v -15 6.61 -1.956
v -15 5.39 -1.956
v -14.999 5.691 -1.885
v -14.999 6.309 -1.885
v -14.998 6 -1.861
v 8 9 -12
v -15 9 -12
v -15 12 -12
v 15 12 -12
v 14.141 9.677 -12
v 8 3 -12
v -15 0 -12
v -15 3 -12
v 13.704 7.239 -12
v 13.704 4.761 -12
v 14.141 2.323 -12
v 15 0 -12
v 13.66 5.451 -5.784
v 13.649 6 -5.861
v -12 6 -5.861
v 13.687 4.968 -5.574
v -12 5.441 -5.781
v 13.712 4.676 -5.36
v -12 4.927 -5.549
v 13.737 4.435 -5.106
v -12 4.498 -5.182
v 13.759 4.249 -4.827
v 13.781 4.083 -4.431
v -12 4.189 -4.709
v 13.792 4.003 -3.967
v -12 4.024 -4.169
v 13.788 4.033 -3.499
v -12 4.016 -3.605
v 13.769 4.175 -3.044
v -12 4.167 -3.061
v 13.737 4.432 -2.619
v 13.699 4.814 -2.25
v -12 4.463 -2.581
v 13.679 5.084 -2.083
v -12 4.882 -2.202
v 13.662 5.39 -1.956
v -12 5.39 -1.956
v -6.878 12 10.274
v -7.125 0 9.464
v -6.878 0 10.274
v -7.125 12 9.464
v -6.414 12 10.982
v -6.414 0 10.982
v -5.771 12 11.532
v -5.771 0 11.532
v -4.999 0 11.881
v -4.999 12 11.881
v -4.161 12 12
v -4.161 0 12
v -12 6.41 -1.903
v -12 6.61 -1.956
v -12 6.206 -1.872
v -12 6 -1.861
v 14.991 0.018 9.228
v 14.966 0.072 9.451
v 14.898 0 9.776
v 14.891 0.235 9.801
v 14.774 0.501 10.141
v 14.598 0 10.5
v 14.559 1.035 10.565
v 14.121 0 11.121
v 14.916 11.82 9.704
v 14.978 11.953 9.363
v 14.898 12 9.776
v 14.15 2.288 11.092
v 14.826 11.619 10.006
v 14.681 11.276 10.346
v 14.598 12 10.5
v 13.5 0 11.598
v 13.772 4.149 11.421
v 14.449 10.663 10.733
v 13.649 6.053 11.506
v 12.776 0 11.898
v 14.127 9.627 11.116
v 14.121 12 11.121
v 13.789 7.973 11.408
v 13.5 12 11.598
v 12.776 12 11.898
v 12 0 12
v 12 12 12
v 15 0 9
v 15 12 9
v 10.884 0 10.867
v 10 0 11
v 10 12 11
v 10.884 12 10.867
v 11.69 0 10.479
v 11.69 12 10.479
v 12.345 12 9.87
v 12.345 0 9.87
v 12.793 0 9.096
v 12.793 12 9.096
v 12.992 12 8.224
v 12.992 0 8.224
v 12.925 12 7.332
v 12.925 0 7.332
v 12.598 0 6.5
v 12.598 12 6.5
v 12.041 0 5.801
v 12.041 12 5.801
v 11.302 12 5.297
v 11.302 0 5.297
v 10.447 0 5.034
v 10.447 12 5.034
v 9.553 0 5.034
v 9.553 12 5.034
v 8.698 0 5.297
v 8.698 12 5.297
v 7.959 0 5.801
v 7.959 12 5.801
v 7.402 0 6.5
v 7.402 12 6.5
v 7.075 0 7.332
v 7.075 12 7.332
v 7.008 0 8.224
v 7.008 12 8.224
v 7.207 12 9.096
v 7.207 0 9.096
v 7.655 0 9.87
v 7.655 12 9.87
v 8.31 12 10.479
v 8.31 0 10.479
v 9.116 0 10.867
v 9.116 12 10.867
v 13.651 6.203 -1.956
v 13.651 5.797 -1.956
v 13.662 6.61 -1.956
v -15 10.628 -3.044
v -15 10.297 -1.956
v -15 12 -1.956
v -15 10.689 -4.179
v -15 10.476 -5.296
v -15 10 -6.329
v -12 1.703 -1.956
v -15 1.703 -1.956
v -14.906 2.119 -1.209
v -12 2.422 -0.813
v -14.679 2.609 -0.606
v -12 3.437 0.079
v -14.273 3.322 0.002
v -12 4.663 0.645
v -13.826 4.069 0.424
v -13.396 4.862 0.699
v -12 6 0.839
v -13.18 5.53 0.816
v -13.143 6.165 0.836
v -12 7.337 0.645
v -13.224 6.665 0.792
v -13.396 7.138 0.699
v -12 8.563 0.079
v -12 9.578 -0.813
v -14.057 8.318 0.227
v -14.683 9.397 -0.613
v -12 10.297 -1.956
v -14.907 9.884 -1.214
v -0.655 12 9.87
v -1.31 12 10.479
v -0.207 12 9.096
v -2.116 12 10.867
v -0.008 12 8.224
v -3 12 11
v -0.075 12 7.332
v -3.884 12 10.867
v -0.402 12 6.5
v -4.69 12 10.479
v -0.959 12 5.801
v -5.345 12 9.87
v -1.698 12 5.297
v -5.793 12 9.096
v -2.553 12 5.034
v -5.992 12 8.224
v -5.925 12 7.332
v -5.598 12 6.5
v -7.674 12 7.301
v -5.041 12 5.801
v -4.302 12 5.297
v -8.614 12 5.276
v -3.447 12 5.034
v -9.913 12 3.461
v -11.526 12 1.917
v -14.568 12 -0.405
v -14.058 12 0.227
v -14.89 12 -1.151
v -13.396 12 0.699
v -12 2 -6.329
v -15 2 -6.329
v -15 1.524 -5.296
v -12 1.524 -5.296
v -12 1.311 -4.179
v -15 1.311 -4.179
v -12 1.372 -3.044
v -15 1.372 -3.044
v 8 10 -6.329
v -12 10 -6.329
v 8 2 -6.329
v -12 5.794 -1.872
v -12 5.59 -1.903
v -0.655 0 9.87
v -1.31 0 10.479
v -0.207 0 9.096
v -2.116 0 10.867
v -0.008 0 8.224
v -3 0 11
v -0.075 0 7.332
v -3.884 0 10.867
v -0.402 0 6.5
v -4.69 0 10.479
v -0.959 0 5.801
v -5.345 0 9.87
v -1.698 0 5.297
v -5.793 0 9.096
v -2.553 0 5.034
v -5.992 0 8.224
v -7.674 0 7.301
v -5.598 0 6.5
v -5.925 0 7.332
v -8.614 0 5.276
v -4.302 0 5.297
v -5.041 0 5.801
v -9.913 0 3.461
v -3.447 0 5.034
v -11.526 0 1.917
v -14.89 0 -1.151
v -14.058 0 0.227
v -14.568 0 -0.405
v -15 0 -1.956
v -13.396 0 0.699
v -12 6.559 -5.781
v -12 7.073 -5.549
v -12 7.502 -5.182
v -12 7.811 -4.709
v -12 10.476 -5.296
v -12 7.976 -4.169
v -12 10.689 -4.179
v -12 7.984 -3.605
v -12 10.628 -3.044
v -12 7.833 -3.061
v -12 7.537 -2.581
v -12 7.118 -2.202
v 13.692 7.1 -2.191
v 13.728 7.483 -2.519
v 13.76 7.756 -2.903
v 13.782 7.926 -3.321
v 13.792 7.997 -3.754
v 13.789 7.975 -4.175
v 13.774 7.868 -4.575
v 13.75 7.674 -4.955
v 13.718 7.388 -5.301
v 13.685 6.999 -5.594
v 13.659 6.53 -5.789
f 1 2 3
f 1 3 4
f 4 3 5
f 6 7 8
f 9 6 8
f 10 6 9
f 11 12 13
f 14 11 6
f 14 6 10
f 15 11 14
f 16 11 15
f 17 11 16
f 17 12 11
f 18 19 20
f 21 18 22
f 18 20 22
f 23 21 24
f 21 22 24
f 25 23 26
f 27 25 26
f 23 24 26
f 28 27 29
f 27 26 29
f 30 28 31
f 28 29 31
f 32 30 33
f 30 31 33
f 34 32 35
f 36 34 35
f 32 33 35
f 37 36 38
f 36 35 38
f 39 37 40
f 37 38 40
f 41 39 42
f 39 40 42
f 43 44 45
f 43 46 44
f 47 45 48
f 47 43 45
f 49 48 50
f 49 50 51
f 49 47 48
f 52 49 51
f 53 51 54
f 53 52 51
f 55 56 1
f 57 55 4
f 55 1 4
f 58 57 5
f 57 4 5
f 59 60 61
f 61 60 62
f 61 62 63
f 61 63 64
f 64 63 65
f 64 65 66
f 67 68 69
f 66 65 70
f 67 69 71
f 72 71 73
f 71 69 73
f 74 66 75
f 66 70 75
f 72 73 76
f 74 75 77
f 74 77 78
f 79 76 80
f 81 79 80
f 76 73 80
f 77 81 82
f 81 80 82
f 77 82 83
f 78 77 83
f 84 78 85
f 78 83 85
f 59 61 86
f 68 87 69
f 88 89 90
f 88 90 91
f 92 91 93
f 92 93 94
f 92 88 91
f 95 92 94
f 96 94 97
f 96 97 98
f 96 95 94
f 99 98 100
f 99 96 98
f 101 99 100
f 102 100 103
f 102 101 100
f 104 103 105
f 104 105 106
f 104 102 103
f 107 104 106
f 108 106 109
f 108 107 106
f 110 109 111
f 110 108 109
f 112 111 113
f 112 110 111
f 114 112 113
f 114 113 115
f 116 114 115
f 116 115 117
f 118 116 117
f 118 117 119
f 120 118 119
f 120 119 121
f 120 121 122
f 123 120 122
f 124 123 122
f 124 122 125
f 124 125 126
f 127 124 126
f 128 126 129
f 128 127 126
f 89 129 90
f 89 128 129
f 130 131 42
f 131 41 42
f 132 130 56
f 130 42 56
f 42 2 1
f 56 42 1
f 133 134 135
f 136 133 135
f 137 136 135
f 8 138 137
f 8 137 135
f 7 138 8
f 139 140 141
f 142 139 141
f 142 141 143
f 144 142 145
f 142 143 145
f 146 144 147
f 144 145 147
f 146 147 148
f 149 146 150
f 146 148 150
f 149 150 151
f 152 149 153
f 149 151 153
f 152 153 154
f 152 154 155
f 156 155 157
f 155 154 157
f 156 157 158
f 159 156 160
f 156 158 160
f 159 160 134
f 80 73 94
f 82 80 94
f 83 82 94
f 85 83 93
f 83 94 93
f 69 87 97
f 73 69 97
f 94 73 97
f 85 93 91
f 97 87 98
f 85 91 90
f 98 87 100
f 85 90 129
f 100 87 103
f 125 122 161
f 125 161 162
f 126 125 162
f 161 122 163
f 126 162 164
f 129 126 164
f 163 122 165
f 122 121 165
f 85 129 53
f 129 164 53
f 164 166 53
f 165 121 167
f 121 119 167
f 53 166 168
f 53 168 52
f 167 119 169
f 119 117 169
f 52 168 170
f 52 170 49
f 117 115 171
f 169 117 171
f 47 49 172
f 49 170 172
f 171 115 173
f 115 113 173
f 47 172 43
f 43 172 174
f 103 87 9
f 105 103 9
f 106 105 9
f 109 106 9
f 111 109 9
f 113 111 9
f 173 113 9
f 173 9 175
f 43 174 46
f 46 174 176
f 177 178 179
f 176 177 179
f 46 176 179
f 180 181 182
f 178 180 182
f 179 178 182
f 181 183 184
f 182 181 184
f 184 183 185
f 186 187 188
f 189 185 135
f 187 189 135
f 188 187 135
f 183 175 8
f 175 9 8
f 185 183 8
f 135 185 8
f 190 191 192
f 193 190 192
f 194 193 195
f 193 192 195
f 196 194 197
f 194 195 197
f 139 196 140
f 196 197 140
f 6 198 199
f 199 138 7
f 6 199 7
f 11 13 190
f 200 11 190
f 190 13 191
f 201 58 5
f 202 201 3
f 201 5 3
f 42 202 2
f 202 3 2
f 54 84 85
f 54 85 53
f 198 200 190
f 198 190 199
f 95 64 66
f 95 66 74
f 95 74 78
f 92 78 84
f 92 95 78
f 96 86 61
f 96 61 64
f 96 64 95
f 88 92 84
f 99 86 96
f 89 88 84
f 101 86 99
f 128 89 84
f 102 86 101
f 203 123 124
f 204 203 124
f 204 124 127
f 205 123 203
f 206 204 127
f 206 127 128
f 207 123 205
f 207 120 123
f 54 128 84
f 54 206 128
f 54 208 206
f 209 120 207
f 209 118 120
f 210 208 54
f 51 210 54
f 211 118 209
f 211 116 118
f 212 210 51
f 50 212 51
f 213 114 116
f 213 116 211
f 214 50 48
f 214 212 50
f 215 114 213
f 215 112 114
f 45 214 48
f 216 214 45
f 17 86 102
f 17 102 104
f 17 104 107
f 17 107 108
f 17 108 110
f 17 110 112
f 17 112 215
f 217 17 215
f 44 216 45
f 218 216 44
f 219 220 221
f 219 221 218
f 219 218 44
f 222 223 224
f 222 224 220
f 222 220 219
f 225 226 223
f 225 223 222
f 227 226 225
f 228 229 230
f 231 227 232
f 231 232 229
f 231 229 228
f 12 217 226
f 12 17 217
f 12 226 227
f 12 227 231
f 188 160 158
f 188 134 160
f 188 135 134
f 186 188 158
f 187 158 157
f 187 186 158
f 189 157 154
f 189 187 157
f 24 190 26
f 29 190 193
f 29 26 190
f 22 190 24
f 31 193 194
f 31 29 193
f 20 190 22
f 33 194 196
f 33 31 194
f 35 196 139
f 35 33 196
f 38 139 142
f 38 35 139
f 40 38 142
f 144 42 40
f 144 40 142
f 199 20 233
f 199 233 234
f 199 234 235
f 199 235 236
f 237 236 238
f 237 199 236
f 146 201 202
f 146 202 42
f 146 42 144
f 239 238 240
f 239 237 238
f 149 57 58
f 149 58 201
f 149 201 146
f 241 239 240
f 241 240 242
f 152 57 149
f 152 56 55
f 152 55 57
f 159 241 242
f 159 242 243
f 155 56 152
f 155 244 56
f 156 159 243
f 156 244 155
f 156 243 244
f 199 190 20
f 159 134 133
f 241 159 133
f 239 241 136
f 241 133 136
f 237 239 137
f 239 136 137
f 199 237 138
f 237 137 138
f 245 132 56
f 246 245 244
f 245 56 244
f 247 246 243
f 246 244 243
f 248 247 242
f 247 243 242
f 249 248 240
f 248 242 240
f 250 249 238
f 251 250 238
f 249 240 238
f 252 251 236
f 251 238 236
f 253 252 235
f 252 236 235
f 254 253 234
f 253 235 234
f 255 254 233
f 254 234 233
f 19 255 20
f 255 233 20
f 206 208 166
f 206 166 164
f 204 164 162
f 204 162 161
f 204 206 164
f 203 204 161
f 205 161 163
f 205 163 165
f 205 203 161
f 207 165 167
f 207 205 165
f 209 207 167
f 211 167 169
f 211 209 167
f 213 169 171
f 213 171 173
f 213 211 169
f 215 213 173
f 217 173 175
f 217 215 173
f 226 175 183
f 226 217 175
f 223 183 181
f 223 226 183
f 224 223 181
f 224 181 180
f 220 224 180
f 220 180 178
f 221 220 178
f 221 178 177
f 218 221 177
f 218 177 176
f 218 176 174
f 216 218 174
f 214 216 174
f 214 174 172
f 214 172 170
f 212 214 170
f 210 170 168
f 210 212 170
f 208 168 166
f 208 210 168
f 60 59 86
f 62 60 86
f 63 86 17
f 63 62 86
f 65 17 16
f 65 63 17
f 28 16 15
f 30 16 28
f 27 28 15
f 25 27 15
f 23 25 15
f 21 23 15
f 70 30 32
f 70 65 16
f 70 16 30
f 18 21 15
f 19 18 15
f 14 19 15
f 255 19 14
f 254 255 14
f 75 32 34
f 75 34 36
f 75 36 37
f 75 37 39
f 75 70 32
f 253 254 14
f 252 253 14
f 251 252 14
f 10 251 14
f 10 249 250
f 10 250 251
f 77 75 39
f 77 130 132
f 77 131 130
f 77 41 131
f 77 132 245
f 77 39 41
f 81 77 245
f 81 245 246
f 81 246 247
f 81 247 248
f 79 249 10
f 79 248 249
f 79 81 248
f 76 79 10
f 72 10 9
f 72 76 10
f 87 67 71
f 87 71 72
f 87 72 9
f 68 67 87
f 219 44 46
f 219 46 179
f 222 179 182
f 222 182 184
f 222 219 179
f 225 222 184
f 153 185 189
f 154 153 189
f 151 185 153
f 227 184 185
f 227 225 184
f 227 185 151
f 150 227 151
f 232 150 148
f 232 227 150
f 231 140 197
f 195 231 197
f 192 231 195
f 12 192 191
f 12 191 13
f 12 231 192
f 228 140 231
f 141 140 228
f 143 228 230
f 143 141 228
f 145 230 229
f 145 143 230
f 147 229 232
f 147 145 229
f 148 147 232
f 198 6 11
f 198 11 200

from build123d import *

# Parameters (mm, degrees)
SKETCH_1_R               = 3
EXTRUDE_1_DEPTH          = 12
FILLET_1_R               = 3
FILLET_2_R               = 3
CUT_EXTRUDE_1_DEPTH      = 23
CUT_EXTRUDE_2_DEPTH      = 35.467375879
SKETCH_2_4_R             = 2
CUT_EXTRUDE_3_DEPTH      = 3
CUT_EXTRUDE_8_DEPTH      = 31.740852386
CUT_EXTRUDE_8_DEPTH_BACK = 31.740852386


with BuildPart() as part:
    # 草图1 → 凸台-拉伸1 (new body)
    with BuildSketch(Plane(origin=(0, 0, 0), x_dir=(1, 0, 0), z_dir=(0, 1, 0))):
        with BuildLine():
            Line((-15, 12), (15, 12))
            Line((15, 12), (15, -12))
            Line((15, -12), (-7, -12))
            ThreePointArc((-7, -12), (-8.996142529, -4.664095019), (-15, 0))
            Line((-15, 0), (-15, 12))
        make_face()
        with Locations((10, -8)):
            Circle(SKETCH_1_R, mode=Mode.SUBTRACT)
        with Locations((-3, -8)):
            Circle(SKETCH_1_R, mode=Mode.SUBTRACT)
    extrude(amount=EXTRUDE_1_DEPTH)

    # 圆角1
    fillet_1_edges = [part.edges().sort_by_distance(p)[0] for p in [
        (-7, 6, 12),
        (-15, 6, 0),
    ]]
    fillet(fillet_1_edges, radius=FILLET_1_R)

    # 圆角2
    fillet_2_edges = [part.edges().sort_by_distance(p)[0] for p in [
        (15, 6, 12),
    ]]
    fillet(fillet_2_edges, radius=FILLET_2_R)

    # 草图2 → 切除-拉伸1 (cut)
    with BuildSketch(Plane.ZY.offset(15)):
        Polygon((-6.32871818, 2), (-6.32871818, 10), (-12, 9), (-12, 3), align=None)
    extrude(amount=-CUT_EXTRUDE_1_DEPTH, mode=Mode.SUBTRACT)

    # 草图2<3> → 切除-拉伸2 (cut, through all)
    with BuildSketch(Plane.ZY.offset(15)):
        with BuildLine():
            Line((-1.956143181, 5.390242862), (-1.956143181, 6.609757138))
            ThreePointArc((-1.956143181, 6.609757138), (-5.860925645, 6), (-1.956143181, 5.390242862))
        make_face()
    extrude(amount=-CUT_EXTRUDE_2_DEPTH, mode=Mode.SUBTRACT)

    # 草图2<4> → 切除-拉伸3 (cut)
    with BuildSketch(Plane.ZY.offset(15)):
        with BuildLine():
            ThreePointArc((-6.32871818, 2), (0.839074355, 6), (-6.32871818, 10))
            Line((-6.32871818, 10), (-6.32871818, 2))
        make_face()
        with Locations((-3.860925645, 6)):
            Circle(SKETCH_2_4_R, mode=Mode.SUBTRACT)
    extrude(amount=-CUT_EXTRUDE_3_DEPTH, mode=Mode.SUBTRACT)

    # 草图4 → 切除-拉伸8 (cut, two sides: drawn at the far end of the back side and taken through both)
    with BuildSketch(Plane(origin=(0, 0, -12), x_dir=(-1, 0, 0), z_dir=(0, 0, -1)).offset(-CUT_EXTRUDE_8_DEPTH_BACK)):
        with BuildLine():
            Line((-46.980847691, 79.421546804), (-15, 12))
            ThreePointArc((-15, 12), (-13.649110641, 6), (-15, 0))
            Line((-15, 0), (-46.980847691, -67.421546804))
            Line((-46.980847691, -67.421546804), (-196.224803582, -67.421546804))
            Line((-196.224803582, -67.421546804), (-196.224803582, 79.421546804))
            Line((-196.224803582, 79.421546804), (-46.980847691, 79.421546804))
        make_face()
    extrude(amount=CUT_EXTRUDE_8_DEPTH + CUT_EXTRUDE_8_DEPTH_BACK, mode=Mode.SUBTRACT)


solid = part.part
